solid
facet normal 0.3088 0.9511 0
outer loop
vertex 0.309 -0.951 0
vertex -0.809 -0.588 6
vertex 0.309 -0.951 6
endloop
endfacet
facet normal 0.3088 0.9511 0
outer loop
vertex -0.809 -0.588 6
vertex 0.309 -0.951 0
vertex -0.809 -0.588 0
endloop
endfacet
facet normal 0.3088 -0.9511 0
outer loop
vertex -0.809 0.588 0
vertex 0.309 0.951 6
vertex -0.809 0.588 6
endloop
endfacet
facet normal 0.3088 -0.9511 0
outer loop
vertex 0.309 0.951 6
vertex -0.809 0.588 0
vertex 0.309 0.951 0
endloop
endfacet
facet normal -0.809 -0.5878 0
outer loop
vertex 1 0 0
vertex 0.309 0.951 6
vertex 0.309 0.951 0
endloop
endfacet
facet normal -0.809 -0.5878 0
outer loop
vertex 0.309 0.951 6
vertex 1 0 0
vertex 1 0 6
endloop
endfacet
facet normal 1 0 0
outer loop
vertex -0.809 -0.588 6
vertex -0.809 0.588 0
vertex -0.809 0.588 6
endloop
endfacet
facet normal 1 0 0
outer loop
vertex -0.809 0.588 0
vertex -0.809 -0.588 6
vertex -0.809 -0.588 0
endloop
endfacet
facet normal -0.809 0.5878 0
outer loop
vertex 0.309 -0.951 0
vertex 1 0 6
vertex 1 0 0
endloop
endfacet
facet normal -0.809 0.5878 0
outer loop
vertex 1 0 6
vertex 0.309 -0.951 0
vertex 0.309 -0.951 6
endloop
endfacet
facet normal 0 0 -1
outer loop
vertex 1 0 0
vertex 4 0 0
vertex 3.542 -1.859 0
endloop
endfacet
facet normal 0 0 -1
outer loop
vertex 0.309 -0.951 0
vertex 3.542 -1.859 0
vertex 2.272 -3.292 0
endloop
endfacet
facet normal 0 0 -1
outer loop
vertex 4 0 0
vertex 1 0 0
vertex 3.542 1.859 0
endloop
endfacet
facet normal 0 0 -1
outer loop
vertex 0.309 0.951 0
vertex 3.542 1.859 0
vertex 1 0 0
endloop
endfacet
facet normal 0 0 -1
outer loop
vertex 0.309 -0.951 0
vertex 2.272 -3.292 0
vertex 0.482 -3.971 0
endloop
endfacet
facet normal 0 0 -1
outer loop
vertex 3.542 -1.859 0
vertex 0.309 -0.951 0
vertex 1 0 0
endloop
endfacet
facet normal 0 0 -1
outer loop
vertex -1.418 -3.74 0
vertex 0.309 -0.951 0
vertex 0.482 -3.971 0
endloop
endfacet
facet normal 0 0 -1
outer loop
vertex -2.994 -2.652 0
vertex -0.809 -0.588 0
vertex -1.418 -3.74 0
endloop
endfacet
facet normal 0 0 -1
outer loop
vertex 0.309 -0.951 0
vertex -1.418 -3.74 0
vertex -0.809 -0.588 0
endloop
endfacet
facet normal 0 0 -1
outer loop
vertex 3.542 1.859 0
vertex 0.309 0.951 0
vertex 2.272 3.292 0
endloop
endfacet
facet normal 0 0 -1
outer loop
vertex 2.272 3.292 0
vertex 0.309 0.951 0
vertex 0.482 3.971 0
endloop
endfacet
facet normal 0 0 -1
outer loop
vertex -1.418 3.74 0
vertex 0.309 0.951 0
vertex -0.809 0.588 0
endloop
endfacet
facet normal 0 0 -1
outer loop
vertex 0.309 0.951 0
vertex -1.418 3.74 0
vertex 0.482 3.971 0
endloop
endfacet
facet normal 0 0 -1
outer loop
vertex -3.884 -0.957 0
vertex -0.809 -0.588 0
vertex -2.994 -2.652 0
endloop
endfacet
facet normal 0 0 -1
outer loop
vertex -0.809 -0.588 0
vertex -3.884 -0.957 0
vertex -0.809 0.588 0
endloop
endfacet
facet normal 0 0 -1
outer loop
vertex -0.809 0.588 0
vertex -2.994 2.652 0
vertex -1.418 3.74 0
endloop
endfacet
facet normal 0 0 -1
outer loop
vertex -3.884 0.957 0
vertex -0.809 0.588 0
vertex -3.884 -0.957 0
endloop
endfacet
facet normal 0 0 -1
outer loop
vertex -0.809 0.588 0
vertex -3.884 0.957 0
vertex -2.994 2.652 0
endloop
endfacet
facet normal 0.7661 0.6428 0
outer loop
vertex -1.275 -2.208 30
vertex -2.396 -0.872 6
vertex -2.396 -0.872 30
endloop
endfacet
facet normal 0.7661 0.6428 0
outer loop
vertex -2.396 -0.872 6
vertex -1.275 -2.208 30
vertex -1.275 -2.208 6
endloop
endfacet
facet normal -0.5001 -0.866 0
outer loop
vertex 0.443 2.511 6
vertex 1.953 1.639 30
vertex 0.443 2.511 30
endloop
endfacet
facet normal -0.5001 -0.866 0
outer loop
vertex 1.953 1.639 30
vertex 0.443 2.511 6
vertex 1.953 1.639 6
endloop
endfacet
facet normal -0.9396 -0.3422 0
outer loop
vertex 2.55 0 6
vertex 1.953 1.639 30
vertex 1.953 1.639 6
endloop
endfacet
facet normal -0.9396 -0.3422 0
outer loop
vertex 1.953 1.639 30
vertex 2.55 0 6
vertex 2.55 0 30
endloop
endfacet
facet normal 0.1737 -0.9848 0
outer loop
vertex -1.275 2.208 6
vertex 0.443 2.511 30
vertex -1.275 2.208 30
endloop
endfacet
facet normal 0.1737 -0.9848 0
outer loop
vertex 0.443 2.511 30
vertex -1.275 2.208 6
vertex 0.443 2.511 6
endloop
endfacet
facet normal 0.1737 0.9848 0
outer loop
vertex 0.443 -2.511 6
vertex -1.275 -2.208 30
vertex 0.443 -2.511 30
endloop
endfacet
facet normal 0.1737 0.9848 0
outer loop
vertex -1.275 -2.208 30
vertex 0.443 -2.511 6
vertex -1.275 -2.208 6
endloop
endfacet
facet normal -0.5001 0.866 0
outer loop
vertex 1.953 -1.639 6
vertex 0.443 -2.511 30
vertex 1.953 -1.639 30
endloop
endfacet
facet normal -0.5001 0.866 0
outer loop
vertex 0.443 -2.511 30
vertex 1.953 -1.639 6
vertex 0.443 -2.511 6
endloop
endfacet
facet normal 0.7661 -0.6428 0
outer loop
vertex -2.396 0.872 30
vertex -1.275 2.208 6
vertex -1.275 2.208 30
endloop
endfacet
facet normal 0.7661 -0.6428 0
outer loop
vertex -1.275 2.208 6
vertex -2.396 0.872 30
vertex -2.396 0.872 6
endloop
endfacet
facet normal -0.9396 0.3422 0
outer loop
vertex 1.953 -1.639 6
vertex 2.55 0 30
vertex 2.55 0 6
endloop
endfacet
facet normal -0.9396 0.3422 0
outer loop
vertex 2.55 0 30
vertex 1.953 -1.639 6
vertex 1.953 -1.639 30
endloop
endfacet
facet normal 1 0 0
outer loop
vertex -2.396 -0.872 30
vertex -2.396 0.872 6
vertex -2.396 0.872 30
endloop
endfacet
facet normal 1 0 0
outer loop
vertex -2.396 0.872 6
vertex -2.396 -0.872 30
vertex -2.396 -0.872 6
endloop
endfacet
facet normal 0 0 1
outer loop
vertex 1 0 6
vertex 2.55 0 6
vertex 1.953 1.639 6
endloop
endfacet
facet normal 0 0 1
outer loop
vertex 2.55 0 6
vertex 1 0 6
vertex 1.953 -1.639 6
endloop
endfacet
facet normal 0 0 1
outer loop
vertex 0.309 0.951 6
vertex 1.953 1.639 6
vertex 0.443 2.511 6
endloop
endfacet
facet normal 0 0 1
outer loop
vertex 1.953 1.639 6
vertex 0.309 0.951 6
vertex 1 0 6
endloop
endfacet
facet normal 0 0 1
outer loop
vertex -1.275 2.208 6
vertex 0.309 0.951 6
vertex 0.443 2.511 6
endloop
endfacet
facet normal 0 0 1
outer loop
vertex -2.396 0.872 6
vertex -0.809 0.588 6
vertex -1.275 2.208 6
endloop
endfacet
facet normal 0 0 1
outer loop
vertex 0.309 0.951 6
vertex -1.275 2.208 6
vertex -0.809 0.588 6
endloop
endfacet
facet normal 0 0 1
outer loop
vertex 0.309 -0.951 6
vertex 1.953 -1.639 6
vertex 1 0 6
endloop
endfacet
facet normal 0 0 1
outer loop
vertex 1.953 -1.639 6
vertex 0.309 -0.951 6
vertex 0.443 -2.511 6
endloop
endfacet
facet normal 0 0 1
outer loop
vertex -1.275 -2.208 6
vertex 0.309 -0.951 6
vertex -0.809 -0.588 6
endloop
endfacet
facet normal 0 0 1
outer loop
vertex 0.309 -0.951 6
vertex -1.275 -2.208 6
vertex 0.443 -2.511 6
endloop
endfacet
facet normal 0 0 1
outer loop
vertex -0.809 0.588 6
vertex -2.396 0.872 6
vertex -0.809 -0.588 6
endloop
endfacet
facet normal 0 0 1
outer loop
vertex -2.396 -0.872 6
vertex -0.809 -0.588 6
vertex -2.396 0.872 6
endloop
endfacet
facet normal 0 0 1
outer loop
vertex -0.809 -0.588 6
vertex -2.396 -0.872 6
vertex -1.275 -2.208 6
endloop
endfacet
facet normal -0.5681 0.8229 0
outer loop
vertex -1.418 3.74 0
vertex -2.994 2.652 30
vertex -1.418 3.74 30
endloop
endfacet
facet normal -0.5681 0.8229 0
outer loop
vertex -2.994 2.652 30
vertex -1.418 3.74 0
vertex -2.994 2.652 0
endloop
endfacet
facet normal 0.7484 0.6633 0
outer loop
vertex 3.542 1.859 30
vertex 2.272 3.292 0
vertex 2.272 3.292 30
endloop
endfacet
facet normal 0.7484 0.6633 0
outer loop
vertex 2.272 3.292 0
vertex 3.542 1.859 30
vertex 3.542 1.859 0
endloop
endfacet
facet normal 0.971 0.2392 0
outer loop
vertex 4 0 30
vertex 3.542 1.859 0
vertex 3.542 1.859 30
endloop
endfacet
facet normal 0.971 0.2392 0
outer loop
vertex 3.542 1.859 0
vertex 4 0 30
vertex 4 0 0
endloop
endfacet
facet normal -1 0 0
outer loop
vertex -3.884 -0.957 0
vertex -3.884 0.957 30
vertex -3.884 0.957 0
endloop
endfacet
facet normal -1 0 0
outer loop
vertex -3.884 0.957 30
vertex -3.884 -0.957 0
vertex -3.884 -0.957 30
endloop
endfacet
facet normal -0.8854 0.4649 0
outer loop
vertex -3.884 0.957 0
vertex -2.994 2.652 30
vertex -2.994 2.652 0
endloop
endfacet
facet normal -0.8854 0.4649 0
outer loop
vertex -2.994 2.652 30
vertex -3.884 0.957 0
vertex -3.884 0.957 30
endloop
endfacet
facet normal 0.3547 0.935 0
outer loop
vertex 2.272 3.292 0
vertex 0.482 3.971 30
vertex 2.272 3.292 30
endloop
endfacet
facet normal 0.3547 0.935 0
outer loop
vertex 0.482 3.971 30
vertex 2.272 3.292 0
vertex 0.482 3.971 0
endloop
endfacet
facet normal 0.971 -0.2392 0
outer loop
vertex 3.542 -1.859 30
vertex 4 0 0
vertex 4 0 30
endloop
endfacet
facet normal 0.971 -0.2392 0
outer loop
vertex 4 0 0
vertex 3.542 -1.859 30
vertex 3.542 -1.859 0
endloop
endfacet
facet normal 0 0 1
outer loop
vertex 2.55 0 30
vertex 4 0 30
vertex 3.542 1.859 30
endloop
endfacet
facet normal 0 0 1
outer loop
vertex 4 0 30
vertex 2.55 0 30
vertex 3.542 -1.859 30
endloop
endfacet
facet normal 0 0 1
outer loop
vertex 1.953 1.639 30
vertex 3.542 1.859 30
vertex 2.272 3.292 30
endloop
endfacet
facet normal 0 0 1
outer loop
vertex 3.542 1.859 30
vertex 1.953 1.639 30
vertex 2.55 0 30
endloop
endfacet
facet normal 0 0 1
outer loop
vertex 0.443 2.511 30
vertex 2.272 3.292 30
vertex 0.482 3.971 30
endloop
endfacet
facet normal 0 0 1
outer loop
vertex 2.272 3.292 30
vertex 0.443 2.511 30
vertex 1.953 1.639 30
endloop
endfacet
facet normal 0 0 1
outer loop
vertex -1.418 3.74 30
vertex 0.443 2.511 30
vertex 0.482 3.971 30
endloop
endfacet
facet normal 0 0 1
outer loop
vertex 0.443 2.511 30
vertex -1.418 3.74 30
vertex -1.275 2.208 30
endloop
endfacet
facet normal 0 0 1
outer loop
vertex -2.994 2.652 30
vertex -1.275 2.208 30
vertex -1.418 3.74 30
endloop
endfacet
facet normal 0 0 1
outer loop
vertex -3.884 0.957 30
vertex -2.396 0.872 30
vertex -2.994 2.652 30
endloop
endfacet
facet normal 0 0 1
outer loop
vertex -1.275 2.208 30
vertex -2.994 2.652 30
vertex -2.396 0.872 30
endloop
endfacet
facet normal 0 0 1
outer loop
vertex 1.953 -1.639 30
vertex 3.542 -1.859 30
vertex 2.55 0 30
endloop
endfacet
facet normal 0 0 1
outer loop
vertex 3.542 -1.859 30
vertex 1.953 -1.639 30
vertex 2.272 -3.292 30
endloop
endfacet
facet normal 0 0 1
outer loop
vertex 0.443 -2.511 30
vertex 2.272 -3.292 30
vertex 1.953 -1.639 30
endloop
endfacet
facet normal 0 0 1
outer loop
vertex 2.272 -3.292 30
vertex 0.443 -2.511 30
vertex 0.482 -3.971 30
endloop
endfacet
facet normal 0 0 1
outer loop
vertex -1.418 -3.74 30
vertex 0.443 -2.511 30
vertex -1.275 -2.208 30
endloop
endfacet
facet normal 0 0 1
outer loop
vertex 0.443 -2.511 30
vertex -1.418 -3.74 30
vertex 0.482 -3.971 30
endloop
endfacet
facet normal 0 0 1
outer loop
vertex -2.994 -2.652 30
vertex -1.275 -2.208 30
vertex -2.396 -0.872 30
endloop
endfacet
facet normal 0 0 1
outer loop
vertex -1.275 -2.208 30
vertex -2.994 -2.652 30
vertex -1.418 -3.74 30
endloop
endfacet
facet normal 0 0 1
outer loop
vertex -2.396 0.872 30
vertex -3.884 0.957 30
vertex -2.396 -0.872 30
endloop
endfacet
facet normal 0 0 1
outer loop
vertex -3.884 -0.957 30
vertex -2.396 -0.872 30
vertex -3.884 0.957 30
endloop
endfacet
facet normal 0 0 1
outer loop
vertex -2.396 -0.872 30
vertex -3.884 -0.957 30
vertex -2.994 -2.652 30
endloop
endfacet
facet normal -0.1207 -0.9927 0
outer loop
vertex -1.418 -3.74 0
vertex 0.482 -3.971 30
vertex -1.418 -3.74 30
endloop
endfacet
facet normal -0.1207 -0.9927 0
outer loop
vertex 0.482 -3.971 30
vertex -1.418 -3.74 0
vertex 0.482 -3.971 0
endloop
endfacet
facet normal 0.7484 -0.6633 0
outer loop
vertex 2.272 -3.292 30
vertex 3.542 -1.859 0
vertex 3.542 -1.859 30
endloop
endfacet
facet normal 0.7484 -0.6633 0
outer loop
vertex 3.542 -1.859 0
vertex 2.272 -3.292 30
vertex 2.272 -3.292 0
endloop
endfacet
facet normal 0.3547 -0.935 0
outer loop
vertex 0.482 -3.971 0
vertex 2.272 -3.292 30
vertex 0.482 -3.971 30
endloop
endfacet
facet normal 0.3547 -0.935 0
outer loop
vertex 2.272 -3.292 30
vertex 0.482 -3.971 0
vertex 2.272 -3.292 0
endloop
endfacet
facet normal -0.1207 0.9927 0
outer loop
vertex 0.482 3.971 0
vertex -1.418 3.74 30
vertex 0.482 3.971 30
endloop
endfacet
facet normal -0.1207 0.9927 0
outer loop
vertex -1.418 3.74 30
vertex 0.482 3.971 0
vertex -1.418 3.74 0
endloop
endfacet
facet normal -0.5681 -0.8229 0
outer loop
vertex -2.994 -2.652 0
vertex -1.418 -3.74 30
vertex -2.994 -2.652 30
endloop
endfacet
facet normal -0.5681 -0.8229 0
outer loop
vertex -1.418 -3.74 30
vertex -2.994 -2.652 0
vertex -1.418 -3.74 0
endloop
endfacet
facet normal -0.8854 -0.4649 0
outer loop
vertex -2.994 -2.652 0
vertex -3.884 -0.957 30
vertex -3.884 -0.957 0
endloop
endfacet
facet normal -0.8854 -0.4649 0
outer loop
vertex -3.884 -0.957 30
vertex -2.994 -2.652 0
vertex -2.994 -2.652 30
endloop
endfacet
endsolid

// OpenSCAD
screwR2 = 1.5+0.5-0.1-0.1-0.05;

TableThickness = 3;


difference() {
  cylinder(r1=4, r2=4, h=30, $n=60);
  union() {
   cylinder(r1=1, r2=1, h=30, $n=60);
   translate([0, 0, 6])   
     cylinder(r1=2.55, r2=2.55, h=30, $n=60);
  }
}
